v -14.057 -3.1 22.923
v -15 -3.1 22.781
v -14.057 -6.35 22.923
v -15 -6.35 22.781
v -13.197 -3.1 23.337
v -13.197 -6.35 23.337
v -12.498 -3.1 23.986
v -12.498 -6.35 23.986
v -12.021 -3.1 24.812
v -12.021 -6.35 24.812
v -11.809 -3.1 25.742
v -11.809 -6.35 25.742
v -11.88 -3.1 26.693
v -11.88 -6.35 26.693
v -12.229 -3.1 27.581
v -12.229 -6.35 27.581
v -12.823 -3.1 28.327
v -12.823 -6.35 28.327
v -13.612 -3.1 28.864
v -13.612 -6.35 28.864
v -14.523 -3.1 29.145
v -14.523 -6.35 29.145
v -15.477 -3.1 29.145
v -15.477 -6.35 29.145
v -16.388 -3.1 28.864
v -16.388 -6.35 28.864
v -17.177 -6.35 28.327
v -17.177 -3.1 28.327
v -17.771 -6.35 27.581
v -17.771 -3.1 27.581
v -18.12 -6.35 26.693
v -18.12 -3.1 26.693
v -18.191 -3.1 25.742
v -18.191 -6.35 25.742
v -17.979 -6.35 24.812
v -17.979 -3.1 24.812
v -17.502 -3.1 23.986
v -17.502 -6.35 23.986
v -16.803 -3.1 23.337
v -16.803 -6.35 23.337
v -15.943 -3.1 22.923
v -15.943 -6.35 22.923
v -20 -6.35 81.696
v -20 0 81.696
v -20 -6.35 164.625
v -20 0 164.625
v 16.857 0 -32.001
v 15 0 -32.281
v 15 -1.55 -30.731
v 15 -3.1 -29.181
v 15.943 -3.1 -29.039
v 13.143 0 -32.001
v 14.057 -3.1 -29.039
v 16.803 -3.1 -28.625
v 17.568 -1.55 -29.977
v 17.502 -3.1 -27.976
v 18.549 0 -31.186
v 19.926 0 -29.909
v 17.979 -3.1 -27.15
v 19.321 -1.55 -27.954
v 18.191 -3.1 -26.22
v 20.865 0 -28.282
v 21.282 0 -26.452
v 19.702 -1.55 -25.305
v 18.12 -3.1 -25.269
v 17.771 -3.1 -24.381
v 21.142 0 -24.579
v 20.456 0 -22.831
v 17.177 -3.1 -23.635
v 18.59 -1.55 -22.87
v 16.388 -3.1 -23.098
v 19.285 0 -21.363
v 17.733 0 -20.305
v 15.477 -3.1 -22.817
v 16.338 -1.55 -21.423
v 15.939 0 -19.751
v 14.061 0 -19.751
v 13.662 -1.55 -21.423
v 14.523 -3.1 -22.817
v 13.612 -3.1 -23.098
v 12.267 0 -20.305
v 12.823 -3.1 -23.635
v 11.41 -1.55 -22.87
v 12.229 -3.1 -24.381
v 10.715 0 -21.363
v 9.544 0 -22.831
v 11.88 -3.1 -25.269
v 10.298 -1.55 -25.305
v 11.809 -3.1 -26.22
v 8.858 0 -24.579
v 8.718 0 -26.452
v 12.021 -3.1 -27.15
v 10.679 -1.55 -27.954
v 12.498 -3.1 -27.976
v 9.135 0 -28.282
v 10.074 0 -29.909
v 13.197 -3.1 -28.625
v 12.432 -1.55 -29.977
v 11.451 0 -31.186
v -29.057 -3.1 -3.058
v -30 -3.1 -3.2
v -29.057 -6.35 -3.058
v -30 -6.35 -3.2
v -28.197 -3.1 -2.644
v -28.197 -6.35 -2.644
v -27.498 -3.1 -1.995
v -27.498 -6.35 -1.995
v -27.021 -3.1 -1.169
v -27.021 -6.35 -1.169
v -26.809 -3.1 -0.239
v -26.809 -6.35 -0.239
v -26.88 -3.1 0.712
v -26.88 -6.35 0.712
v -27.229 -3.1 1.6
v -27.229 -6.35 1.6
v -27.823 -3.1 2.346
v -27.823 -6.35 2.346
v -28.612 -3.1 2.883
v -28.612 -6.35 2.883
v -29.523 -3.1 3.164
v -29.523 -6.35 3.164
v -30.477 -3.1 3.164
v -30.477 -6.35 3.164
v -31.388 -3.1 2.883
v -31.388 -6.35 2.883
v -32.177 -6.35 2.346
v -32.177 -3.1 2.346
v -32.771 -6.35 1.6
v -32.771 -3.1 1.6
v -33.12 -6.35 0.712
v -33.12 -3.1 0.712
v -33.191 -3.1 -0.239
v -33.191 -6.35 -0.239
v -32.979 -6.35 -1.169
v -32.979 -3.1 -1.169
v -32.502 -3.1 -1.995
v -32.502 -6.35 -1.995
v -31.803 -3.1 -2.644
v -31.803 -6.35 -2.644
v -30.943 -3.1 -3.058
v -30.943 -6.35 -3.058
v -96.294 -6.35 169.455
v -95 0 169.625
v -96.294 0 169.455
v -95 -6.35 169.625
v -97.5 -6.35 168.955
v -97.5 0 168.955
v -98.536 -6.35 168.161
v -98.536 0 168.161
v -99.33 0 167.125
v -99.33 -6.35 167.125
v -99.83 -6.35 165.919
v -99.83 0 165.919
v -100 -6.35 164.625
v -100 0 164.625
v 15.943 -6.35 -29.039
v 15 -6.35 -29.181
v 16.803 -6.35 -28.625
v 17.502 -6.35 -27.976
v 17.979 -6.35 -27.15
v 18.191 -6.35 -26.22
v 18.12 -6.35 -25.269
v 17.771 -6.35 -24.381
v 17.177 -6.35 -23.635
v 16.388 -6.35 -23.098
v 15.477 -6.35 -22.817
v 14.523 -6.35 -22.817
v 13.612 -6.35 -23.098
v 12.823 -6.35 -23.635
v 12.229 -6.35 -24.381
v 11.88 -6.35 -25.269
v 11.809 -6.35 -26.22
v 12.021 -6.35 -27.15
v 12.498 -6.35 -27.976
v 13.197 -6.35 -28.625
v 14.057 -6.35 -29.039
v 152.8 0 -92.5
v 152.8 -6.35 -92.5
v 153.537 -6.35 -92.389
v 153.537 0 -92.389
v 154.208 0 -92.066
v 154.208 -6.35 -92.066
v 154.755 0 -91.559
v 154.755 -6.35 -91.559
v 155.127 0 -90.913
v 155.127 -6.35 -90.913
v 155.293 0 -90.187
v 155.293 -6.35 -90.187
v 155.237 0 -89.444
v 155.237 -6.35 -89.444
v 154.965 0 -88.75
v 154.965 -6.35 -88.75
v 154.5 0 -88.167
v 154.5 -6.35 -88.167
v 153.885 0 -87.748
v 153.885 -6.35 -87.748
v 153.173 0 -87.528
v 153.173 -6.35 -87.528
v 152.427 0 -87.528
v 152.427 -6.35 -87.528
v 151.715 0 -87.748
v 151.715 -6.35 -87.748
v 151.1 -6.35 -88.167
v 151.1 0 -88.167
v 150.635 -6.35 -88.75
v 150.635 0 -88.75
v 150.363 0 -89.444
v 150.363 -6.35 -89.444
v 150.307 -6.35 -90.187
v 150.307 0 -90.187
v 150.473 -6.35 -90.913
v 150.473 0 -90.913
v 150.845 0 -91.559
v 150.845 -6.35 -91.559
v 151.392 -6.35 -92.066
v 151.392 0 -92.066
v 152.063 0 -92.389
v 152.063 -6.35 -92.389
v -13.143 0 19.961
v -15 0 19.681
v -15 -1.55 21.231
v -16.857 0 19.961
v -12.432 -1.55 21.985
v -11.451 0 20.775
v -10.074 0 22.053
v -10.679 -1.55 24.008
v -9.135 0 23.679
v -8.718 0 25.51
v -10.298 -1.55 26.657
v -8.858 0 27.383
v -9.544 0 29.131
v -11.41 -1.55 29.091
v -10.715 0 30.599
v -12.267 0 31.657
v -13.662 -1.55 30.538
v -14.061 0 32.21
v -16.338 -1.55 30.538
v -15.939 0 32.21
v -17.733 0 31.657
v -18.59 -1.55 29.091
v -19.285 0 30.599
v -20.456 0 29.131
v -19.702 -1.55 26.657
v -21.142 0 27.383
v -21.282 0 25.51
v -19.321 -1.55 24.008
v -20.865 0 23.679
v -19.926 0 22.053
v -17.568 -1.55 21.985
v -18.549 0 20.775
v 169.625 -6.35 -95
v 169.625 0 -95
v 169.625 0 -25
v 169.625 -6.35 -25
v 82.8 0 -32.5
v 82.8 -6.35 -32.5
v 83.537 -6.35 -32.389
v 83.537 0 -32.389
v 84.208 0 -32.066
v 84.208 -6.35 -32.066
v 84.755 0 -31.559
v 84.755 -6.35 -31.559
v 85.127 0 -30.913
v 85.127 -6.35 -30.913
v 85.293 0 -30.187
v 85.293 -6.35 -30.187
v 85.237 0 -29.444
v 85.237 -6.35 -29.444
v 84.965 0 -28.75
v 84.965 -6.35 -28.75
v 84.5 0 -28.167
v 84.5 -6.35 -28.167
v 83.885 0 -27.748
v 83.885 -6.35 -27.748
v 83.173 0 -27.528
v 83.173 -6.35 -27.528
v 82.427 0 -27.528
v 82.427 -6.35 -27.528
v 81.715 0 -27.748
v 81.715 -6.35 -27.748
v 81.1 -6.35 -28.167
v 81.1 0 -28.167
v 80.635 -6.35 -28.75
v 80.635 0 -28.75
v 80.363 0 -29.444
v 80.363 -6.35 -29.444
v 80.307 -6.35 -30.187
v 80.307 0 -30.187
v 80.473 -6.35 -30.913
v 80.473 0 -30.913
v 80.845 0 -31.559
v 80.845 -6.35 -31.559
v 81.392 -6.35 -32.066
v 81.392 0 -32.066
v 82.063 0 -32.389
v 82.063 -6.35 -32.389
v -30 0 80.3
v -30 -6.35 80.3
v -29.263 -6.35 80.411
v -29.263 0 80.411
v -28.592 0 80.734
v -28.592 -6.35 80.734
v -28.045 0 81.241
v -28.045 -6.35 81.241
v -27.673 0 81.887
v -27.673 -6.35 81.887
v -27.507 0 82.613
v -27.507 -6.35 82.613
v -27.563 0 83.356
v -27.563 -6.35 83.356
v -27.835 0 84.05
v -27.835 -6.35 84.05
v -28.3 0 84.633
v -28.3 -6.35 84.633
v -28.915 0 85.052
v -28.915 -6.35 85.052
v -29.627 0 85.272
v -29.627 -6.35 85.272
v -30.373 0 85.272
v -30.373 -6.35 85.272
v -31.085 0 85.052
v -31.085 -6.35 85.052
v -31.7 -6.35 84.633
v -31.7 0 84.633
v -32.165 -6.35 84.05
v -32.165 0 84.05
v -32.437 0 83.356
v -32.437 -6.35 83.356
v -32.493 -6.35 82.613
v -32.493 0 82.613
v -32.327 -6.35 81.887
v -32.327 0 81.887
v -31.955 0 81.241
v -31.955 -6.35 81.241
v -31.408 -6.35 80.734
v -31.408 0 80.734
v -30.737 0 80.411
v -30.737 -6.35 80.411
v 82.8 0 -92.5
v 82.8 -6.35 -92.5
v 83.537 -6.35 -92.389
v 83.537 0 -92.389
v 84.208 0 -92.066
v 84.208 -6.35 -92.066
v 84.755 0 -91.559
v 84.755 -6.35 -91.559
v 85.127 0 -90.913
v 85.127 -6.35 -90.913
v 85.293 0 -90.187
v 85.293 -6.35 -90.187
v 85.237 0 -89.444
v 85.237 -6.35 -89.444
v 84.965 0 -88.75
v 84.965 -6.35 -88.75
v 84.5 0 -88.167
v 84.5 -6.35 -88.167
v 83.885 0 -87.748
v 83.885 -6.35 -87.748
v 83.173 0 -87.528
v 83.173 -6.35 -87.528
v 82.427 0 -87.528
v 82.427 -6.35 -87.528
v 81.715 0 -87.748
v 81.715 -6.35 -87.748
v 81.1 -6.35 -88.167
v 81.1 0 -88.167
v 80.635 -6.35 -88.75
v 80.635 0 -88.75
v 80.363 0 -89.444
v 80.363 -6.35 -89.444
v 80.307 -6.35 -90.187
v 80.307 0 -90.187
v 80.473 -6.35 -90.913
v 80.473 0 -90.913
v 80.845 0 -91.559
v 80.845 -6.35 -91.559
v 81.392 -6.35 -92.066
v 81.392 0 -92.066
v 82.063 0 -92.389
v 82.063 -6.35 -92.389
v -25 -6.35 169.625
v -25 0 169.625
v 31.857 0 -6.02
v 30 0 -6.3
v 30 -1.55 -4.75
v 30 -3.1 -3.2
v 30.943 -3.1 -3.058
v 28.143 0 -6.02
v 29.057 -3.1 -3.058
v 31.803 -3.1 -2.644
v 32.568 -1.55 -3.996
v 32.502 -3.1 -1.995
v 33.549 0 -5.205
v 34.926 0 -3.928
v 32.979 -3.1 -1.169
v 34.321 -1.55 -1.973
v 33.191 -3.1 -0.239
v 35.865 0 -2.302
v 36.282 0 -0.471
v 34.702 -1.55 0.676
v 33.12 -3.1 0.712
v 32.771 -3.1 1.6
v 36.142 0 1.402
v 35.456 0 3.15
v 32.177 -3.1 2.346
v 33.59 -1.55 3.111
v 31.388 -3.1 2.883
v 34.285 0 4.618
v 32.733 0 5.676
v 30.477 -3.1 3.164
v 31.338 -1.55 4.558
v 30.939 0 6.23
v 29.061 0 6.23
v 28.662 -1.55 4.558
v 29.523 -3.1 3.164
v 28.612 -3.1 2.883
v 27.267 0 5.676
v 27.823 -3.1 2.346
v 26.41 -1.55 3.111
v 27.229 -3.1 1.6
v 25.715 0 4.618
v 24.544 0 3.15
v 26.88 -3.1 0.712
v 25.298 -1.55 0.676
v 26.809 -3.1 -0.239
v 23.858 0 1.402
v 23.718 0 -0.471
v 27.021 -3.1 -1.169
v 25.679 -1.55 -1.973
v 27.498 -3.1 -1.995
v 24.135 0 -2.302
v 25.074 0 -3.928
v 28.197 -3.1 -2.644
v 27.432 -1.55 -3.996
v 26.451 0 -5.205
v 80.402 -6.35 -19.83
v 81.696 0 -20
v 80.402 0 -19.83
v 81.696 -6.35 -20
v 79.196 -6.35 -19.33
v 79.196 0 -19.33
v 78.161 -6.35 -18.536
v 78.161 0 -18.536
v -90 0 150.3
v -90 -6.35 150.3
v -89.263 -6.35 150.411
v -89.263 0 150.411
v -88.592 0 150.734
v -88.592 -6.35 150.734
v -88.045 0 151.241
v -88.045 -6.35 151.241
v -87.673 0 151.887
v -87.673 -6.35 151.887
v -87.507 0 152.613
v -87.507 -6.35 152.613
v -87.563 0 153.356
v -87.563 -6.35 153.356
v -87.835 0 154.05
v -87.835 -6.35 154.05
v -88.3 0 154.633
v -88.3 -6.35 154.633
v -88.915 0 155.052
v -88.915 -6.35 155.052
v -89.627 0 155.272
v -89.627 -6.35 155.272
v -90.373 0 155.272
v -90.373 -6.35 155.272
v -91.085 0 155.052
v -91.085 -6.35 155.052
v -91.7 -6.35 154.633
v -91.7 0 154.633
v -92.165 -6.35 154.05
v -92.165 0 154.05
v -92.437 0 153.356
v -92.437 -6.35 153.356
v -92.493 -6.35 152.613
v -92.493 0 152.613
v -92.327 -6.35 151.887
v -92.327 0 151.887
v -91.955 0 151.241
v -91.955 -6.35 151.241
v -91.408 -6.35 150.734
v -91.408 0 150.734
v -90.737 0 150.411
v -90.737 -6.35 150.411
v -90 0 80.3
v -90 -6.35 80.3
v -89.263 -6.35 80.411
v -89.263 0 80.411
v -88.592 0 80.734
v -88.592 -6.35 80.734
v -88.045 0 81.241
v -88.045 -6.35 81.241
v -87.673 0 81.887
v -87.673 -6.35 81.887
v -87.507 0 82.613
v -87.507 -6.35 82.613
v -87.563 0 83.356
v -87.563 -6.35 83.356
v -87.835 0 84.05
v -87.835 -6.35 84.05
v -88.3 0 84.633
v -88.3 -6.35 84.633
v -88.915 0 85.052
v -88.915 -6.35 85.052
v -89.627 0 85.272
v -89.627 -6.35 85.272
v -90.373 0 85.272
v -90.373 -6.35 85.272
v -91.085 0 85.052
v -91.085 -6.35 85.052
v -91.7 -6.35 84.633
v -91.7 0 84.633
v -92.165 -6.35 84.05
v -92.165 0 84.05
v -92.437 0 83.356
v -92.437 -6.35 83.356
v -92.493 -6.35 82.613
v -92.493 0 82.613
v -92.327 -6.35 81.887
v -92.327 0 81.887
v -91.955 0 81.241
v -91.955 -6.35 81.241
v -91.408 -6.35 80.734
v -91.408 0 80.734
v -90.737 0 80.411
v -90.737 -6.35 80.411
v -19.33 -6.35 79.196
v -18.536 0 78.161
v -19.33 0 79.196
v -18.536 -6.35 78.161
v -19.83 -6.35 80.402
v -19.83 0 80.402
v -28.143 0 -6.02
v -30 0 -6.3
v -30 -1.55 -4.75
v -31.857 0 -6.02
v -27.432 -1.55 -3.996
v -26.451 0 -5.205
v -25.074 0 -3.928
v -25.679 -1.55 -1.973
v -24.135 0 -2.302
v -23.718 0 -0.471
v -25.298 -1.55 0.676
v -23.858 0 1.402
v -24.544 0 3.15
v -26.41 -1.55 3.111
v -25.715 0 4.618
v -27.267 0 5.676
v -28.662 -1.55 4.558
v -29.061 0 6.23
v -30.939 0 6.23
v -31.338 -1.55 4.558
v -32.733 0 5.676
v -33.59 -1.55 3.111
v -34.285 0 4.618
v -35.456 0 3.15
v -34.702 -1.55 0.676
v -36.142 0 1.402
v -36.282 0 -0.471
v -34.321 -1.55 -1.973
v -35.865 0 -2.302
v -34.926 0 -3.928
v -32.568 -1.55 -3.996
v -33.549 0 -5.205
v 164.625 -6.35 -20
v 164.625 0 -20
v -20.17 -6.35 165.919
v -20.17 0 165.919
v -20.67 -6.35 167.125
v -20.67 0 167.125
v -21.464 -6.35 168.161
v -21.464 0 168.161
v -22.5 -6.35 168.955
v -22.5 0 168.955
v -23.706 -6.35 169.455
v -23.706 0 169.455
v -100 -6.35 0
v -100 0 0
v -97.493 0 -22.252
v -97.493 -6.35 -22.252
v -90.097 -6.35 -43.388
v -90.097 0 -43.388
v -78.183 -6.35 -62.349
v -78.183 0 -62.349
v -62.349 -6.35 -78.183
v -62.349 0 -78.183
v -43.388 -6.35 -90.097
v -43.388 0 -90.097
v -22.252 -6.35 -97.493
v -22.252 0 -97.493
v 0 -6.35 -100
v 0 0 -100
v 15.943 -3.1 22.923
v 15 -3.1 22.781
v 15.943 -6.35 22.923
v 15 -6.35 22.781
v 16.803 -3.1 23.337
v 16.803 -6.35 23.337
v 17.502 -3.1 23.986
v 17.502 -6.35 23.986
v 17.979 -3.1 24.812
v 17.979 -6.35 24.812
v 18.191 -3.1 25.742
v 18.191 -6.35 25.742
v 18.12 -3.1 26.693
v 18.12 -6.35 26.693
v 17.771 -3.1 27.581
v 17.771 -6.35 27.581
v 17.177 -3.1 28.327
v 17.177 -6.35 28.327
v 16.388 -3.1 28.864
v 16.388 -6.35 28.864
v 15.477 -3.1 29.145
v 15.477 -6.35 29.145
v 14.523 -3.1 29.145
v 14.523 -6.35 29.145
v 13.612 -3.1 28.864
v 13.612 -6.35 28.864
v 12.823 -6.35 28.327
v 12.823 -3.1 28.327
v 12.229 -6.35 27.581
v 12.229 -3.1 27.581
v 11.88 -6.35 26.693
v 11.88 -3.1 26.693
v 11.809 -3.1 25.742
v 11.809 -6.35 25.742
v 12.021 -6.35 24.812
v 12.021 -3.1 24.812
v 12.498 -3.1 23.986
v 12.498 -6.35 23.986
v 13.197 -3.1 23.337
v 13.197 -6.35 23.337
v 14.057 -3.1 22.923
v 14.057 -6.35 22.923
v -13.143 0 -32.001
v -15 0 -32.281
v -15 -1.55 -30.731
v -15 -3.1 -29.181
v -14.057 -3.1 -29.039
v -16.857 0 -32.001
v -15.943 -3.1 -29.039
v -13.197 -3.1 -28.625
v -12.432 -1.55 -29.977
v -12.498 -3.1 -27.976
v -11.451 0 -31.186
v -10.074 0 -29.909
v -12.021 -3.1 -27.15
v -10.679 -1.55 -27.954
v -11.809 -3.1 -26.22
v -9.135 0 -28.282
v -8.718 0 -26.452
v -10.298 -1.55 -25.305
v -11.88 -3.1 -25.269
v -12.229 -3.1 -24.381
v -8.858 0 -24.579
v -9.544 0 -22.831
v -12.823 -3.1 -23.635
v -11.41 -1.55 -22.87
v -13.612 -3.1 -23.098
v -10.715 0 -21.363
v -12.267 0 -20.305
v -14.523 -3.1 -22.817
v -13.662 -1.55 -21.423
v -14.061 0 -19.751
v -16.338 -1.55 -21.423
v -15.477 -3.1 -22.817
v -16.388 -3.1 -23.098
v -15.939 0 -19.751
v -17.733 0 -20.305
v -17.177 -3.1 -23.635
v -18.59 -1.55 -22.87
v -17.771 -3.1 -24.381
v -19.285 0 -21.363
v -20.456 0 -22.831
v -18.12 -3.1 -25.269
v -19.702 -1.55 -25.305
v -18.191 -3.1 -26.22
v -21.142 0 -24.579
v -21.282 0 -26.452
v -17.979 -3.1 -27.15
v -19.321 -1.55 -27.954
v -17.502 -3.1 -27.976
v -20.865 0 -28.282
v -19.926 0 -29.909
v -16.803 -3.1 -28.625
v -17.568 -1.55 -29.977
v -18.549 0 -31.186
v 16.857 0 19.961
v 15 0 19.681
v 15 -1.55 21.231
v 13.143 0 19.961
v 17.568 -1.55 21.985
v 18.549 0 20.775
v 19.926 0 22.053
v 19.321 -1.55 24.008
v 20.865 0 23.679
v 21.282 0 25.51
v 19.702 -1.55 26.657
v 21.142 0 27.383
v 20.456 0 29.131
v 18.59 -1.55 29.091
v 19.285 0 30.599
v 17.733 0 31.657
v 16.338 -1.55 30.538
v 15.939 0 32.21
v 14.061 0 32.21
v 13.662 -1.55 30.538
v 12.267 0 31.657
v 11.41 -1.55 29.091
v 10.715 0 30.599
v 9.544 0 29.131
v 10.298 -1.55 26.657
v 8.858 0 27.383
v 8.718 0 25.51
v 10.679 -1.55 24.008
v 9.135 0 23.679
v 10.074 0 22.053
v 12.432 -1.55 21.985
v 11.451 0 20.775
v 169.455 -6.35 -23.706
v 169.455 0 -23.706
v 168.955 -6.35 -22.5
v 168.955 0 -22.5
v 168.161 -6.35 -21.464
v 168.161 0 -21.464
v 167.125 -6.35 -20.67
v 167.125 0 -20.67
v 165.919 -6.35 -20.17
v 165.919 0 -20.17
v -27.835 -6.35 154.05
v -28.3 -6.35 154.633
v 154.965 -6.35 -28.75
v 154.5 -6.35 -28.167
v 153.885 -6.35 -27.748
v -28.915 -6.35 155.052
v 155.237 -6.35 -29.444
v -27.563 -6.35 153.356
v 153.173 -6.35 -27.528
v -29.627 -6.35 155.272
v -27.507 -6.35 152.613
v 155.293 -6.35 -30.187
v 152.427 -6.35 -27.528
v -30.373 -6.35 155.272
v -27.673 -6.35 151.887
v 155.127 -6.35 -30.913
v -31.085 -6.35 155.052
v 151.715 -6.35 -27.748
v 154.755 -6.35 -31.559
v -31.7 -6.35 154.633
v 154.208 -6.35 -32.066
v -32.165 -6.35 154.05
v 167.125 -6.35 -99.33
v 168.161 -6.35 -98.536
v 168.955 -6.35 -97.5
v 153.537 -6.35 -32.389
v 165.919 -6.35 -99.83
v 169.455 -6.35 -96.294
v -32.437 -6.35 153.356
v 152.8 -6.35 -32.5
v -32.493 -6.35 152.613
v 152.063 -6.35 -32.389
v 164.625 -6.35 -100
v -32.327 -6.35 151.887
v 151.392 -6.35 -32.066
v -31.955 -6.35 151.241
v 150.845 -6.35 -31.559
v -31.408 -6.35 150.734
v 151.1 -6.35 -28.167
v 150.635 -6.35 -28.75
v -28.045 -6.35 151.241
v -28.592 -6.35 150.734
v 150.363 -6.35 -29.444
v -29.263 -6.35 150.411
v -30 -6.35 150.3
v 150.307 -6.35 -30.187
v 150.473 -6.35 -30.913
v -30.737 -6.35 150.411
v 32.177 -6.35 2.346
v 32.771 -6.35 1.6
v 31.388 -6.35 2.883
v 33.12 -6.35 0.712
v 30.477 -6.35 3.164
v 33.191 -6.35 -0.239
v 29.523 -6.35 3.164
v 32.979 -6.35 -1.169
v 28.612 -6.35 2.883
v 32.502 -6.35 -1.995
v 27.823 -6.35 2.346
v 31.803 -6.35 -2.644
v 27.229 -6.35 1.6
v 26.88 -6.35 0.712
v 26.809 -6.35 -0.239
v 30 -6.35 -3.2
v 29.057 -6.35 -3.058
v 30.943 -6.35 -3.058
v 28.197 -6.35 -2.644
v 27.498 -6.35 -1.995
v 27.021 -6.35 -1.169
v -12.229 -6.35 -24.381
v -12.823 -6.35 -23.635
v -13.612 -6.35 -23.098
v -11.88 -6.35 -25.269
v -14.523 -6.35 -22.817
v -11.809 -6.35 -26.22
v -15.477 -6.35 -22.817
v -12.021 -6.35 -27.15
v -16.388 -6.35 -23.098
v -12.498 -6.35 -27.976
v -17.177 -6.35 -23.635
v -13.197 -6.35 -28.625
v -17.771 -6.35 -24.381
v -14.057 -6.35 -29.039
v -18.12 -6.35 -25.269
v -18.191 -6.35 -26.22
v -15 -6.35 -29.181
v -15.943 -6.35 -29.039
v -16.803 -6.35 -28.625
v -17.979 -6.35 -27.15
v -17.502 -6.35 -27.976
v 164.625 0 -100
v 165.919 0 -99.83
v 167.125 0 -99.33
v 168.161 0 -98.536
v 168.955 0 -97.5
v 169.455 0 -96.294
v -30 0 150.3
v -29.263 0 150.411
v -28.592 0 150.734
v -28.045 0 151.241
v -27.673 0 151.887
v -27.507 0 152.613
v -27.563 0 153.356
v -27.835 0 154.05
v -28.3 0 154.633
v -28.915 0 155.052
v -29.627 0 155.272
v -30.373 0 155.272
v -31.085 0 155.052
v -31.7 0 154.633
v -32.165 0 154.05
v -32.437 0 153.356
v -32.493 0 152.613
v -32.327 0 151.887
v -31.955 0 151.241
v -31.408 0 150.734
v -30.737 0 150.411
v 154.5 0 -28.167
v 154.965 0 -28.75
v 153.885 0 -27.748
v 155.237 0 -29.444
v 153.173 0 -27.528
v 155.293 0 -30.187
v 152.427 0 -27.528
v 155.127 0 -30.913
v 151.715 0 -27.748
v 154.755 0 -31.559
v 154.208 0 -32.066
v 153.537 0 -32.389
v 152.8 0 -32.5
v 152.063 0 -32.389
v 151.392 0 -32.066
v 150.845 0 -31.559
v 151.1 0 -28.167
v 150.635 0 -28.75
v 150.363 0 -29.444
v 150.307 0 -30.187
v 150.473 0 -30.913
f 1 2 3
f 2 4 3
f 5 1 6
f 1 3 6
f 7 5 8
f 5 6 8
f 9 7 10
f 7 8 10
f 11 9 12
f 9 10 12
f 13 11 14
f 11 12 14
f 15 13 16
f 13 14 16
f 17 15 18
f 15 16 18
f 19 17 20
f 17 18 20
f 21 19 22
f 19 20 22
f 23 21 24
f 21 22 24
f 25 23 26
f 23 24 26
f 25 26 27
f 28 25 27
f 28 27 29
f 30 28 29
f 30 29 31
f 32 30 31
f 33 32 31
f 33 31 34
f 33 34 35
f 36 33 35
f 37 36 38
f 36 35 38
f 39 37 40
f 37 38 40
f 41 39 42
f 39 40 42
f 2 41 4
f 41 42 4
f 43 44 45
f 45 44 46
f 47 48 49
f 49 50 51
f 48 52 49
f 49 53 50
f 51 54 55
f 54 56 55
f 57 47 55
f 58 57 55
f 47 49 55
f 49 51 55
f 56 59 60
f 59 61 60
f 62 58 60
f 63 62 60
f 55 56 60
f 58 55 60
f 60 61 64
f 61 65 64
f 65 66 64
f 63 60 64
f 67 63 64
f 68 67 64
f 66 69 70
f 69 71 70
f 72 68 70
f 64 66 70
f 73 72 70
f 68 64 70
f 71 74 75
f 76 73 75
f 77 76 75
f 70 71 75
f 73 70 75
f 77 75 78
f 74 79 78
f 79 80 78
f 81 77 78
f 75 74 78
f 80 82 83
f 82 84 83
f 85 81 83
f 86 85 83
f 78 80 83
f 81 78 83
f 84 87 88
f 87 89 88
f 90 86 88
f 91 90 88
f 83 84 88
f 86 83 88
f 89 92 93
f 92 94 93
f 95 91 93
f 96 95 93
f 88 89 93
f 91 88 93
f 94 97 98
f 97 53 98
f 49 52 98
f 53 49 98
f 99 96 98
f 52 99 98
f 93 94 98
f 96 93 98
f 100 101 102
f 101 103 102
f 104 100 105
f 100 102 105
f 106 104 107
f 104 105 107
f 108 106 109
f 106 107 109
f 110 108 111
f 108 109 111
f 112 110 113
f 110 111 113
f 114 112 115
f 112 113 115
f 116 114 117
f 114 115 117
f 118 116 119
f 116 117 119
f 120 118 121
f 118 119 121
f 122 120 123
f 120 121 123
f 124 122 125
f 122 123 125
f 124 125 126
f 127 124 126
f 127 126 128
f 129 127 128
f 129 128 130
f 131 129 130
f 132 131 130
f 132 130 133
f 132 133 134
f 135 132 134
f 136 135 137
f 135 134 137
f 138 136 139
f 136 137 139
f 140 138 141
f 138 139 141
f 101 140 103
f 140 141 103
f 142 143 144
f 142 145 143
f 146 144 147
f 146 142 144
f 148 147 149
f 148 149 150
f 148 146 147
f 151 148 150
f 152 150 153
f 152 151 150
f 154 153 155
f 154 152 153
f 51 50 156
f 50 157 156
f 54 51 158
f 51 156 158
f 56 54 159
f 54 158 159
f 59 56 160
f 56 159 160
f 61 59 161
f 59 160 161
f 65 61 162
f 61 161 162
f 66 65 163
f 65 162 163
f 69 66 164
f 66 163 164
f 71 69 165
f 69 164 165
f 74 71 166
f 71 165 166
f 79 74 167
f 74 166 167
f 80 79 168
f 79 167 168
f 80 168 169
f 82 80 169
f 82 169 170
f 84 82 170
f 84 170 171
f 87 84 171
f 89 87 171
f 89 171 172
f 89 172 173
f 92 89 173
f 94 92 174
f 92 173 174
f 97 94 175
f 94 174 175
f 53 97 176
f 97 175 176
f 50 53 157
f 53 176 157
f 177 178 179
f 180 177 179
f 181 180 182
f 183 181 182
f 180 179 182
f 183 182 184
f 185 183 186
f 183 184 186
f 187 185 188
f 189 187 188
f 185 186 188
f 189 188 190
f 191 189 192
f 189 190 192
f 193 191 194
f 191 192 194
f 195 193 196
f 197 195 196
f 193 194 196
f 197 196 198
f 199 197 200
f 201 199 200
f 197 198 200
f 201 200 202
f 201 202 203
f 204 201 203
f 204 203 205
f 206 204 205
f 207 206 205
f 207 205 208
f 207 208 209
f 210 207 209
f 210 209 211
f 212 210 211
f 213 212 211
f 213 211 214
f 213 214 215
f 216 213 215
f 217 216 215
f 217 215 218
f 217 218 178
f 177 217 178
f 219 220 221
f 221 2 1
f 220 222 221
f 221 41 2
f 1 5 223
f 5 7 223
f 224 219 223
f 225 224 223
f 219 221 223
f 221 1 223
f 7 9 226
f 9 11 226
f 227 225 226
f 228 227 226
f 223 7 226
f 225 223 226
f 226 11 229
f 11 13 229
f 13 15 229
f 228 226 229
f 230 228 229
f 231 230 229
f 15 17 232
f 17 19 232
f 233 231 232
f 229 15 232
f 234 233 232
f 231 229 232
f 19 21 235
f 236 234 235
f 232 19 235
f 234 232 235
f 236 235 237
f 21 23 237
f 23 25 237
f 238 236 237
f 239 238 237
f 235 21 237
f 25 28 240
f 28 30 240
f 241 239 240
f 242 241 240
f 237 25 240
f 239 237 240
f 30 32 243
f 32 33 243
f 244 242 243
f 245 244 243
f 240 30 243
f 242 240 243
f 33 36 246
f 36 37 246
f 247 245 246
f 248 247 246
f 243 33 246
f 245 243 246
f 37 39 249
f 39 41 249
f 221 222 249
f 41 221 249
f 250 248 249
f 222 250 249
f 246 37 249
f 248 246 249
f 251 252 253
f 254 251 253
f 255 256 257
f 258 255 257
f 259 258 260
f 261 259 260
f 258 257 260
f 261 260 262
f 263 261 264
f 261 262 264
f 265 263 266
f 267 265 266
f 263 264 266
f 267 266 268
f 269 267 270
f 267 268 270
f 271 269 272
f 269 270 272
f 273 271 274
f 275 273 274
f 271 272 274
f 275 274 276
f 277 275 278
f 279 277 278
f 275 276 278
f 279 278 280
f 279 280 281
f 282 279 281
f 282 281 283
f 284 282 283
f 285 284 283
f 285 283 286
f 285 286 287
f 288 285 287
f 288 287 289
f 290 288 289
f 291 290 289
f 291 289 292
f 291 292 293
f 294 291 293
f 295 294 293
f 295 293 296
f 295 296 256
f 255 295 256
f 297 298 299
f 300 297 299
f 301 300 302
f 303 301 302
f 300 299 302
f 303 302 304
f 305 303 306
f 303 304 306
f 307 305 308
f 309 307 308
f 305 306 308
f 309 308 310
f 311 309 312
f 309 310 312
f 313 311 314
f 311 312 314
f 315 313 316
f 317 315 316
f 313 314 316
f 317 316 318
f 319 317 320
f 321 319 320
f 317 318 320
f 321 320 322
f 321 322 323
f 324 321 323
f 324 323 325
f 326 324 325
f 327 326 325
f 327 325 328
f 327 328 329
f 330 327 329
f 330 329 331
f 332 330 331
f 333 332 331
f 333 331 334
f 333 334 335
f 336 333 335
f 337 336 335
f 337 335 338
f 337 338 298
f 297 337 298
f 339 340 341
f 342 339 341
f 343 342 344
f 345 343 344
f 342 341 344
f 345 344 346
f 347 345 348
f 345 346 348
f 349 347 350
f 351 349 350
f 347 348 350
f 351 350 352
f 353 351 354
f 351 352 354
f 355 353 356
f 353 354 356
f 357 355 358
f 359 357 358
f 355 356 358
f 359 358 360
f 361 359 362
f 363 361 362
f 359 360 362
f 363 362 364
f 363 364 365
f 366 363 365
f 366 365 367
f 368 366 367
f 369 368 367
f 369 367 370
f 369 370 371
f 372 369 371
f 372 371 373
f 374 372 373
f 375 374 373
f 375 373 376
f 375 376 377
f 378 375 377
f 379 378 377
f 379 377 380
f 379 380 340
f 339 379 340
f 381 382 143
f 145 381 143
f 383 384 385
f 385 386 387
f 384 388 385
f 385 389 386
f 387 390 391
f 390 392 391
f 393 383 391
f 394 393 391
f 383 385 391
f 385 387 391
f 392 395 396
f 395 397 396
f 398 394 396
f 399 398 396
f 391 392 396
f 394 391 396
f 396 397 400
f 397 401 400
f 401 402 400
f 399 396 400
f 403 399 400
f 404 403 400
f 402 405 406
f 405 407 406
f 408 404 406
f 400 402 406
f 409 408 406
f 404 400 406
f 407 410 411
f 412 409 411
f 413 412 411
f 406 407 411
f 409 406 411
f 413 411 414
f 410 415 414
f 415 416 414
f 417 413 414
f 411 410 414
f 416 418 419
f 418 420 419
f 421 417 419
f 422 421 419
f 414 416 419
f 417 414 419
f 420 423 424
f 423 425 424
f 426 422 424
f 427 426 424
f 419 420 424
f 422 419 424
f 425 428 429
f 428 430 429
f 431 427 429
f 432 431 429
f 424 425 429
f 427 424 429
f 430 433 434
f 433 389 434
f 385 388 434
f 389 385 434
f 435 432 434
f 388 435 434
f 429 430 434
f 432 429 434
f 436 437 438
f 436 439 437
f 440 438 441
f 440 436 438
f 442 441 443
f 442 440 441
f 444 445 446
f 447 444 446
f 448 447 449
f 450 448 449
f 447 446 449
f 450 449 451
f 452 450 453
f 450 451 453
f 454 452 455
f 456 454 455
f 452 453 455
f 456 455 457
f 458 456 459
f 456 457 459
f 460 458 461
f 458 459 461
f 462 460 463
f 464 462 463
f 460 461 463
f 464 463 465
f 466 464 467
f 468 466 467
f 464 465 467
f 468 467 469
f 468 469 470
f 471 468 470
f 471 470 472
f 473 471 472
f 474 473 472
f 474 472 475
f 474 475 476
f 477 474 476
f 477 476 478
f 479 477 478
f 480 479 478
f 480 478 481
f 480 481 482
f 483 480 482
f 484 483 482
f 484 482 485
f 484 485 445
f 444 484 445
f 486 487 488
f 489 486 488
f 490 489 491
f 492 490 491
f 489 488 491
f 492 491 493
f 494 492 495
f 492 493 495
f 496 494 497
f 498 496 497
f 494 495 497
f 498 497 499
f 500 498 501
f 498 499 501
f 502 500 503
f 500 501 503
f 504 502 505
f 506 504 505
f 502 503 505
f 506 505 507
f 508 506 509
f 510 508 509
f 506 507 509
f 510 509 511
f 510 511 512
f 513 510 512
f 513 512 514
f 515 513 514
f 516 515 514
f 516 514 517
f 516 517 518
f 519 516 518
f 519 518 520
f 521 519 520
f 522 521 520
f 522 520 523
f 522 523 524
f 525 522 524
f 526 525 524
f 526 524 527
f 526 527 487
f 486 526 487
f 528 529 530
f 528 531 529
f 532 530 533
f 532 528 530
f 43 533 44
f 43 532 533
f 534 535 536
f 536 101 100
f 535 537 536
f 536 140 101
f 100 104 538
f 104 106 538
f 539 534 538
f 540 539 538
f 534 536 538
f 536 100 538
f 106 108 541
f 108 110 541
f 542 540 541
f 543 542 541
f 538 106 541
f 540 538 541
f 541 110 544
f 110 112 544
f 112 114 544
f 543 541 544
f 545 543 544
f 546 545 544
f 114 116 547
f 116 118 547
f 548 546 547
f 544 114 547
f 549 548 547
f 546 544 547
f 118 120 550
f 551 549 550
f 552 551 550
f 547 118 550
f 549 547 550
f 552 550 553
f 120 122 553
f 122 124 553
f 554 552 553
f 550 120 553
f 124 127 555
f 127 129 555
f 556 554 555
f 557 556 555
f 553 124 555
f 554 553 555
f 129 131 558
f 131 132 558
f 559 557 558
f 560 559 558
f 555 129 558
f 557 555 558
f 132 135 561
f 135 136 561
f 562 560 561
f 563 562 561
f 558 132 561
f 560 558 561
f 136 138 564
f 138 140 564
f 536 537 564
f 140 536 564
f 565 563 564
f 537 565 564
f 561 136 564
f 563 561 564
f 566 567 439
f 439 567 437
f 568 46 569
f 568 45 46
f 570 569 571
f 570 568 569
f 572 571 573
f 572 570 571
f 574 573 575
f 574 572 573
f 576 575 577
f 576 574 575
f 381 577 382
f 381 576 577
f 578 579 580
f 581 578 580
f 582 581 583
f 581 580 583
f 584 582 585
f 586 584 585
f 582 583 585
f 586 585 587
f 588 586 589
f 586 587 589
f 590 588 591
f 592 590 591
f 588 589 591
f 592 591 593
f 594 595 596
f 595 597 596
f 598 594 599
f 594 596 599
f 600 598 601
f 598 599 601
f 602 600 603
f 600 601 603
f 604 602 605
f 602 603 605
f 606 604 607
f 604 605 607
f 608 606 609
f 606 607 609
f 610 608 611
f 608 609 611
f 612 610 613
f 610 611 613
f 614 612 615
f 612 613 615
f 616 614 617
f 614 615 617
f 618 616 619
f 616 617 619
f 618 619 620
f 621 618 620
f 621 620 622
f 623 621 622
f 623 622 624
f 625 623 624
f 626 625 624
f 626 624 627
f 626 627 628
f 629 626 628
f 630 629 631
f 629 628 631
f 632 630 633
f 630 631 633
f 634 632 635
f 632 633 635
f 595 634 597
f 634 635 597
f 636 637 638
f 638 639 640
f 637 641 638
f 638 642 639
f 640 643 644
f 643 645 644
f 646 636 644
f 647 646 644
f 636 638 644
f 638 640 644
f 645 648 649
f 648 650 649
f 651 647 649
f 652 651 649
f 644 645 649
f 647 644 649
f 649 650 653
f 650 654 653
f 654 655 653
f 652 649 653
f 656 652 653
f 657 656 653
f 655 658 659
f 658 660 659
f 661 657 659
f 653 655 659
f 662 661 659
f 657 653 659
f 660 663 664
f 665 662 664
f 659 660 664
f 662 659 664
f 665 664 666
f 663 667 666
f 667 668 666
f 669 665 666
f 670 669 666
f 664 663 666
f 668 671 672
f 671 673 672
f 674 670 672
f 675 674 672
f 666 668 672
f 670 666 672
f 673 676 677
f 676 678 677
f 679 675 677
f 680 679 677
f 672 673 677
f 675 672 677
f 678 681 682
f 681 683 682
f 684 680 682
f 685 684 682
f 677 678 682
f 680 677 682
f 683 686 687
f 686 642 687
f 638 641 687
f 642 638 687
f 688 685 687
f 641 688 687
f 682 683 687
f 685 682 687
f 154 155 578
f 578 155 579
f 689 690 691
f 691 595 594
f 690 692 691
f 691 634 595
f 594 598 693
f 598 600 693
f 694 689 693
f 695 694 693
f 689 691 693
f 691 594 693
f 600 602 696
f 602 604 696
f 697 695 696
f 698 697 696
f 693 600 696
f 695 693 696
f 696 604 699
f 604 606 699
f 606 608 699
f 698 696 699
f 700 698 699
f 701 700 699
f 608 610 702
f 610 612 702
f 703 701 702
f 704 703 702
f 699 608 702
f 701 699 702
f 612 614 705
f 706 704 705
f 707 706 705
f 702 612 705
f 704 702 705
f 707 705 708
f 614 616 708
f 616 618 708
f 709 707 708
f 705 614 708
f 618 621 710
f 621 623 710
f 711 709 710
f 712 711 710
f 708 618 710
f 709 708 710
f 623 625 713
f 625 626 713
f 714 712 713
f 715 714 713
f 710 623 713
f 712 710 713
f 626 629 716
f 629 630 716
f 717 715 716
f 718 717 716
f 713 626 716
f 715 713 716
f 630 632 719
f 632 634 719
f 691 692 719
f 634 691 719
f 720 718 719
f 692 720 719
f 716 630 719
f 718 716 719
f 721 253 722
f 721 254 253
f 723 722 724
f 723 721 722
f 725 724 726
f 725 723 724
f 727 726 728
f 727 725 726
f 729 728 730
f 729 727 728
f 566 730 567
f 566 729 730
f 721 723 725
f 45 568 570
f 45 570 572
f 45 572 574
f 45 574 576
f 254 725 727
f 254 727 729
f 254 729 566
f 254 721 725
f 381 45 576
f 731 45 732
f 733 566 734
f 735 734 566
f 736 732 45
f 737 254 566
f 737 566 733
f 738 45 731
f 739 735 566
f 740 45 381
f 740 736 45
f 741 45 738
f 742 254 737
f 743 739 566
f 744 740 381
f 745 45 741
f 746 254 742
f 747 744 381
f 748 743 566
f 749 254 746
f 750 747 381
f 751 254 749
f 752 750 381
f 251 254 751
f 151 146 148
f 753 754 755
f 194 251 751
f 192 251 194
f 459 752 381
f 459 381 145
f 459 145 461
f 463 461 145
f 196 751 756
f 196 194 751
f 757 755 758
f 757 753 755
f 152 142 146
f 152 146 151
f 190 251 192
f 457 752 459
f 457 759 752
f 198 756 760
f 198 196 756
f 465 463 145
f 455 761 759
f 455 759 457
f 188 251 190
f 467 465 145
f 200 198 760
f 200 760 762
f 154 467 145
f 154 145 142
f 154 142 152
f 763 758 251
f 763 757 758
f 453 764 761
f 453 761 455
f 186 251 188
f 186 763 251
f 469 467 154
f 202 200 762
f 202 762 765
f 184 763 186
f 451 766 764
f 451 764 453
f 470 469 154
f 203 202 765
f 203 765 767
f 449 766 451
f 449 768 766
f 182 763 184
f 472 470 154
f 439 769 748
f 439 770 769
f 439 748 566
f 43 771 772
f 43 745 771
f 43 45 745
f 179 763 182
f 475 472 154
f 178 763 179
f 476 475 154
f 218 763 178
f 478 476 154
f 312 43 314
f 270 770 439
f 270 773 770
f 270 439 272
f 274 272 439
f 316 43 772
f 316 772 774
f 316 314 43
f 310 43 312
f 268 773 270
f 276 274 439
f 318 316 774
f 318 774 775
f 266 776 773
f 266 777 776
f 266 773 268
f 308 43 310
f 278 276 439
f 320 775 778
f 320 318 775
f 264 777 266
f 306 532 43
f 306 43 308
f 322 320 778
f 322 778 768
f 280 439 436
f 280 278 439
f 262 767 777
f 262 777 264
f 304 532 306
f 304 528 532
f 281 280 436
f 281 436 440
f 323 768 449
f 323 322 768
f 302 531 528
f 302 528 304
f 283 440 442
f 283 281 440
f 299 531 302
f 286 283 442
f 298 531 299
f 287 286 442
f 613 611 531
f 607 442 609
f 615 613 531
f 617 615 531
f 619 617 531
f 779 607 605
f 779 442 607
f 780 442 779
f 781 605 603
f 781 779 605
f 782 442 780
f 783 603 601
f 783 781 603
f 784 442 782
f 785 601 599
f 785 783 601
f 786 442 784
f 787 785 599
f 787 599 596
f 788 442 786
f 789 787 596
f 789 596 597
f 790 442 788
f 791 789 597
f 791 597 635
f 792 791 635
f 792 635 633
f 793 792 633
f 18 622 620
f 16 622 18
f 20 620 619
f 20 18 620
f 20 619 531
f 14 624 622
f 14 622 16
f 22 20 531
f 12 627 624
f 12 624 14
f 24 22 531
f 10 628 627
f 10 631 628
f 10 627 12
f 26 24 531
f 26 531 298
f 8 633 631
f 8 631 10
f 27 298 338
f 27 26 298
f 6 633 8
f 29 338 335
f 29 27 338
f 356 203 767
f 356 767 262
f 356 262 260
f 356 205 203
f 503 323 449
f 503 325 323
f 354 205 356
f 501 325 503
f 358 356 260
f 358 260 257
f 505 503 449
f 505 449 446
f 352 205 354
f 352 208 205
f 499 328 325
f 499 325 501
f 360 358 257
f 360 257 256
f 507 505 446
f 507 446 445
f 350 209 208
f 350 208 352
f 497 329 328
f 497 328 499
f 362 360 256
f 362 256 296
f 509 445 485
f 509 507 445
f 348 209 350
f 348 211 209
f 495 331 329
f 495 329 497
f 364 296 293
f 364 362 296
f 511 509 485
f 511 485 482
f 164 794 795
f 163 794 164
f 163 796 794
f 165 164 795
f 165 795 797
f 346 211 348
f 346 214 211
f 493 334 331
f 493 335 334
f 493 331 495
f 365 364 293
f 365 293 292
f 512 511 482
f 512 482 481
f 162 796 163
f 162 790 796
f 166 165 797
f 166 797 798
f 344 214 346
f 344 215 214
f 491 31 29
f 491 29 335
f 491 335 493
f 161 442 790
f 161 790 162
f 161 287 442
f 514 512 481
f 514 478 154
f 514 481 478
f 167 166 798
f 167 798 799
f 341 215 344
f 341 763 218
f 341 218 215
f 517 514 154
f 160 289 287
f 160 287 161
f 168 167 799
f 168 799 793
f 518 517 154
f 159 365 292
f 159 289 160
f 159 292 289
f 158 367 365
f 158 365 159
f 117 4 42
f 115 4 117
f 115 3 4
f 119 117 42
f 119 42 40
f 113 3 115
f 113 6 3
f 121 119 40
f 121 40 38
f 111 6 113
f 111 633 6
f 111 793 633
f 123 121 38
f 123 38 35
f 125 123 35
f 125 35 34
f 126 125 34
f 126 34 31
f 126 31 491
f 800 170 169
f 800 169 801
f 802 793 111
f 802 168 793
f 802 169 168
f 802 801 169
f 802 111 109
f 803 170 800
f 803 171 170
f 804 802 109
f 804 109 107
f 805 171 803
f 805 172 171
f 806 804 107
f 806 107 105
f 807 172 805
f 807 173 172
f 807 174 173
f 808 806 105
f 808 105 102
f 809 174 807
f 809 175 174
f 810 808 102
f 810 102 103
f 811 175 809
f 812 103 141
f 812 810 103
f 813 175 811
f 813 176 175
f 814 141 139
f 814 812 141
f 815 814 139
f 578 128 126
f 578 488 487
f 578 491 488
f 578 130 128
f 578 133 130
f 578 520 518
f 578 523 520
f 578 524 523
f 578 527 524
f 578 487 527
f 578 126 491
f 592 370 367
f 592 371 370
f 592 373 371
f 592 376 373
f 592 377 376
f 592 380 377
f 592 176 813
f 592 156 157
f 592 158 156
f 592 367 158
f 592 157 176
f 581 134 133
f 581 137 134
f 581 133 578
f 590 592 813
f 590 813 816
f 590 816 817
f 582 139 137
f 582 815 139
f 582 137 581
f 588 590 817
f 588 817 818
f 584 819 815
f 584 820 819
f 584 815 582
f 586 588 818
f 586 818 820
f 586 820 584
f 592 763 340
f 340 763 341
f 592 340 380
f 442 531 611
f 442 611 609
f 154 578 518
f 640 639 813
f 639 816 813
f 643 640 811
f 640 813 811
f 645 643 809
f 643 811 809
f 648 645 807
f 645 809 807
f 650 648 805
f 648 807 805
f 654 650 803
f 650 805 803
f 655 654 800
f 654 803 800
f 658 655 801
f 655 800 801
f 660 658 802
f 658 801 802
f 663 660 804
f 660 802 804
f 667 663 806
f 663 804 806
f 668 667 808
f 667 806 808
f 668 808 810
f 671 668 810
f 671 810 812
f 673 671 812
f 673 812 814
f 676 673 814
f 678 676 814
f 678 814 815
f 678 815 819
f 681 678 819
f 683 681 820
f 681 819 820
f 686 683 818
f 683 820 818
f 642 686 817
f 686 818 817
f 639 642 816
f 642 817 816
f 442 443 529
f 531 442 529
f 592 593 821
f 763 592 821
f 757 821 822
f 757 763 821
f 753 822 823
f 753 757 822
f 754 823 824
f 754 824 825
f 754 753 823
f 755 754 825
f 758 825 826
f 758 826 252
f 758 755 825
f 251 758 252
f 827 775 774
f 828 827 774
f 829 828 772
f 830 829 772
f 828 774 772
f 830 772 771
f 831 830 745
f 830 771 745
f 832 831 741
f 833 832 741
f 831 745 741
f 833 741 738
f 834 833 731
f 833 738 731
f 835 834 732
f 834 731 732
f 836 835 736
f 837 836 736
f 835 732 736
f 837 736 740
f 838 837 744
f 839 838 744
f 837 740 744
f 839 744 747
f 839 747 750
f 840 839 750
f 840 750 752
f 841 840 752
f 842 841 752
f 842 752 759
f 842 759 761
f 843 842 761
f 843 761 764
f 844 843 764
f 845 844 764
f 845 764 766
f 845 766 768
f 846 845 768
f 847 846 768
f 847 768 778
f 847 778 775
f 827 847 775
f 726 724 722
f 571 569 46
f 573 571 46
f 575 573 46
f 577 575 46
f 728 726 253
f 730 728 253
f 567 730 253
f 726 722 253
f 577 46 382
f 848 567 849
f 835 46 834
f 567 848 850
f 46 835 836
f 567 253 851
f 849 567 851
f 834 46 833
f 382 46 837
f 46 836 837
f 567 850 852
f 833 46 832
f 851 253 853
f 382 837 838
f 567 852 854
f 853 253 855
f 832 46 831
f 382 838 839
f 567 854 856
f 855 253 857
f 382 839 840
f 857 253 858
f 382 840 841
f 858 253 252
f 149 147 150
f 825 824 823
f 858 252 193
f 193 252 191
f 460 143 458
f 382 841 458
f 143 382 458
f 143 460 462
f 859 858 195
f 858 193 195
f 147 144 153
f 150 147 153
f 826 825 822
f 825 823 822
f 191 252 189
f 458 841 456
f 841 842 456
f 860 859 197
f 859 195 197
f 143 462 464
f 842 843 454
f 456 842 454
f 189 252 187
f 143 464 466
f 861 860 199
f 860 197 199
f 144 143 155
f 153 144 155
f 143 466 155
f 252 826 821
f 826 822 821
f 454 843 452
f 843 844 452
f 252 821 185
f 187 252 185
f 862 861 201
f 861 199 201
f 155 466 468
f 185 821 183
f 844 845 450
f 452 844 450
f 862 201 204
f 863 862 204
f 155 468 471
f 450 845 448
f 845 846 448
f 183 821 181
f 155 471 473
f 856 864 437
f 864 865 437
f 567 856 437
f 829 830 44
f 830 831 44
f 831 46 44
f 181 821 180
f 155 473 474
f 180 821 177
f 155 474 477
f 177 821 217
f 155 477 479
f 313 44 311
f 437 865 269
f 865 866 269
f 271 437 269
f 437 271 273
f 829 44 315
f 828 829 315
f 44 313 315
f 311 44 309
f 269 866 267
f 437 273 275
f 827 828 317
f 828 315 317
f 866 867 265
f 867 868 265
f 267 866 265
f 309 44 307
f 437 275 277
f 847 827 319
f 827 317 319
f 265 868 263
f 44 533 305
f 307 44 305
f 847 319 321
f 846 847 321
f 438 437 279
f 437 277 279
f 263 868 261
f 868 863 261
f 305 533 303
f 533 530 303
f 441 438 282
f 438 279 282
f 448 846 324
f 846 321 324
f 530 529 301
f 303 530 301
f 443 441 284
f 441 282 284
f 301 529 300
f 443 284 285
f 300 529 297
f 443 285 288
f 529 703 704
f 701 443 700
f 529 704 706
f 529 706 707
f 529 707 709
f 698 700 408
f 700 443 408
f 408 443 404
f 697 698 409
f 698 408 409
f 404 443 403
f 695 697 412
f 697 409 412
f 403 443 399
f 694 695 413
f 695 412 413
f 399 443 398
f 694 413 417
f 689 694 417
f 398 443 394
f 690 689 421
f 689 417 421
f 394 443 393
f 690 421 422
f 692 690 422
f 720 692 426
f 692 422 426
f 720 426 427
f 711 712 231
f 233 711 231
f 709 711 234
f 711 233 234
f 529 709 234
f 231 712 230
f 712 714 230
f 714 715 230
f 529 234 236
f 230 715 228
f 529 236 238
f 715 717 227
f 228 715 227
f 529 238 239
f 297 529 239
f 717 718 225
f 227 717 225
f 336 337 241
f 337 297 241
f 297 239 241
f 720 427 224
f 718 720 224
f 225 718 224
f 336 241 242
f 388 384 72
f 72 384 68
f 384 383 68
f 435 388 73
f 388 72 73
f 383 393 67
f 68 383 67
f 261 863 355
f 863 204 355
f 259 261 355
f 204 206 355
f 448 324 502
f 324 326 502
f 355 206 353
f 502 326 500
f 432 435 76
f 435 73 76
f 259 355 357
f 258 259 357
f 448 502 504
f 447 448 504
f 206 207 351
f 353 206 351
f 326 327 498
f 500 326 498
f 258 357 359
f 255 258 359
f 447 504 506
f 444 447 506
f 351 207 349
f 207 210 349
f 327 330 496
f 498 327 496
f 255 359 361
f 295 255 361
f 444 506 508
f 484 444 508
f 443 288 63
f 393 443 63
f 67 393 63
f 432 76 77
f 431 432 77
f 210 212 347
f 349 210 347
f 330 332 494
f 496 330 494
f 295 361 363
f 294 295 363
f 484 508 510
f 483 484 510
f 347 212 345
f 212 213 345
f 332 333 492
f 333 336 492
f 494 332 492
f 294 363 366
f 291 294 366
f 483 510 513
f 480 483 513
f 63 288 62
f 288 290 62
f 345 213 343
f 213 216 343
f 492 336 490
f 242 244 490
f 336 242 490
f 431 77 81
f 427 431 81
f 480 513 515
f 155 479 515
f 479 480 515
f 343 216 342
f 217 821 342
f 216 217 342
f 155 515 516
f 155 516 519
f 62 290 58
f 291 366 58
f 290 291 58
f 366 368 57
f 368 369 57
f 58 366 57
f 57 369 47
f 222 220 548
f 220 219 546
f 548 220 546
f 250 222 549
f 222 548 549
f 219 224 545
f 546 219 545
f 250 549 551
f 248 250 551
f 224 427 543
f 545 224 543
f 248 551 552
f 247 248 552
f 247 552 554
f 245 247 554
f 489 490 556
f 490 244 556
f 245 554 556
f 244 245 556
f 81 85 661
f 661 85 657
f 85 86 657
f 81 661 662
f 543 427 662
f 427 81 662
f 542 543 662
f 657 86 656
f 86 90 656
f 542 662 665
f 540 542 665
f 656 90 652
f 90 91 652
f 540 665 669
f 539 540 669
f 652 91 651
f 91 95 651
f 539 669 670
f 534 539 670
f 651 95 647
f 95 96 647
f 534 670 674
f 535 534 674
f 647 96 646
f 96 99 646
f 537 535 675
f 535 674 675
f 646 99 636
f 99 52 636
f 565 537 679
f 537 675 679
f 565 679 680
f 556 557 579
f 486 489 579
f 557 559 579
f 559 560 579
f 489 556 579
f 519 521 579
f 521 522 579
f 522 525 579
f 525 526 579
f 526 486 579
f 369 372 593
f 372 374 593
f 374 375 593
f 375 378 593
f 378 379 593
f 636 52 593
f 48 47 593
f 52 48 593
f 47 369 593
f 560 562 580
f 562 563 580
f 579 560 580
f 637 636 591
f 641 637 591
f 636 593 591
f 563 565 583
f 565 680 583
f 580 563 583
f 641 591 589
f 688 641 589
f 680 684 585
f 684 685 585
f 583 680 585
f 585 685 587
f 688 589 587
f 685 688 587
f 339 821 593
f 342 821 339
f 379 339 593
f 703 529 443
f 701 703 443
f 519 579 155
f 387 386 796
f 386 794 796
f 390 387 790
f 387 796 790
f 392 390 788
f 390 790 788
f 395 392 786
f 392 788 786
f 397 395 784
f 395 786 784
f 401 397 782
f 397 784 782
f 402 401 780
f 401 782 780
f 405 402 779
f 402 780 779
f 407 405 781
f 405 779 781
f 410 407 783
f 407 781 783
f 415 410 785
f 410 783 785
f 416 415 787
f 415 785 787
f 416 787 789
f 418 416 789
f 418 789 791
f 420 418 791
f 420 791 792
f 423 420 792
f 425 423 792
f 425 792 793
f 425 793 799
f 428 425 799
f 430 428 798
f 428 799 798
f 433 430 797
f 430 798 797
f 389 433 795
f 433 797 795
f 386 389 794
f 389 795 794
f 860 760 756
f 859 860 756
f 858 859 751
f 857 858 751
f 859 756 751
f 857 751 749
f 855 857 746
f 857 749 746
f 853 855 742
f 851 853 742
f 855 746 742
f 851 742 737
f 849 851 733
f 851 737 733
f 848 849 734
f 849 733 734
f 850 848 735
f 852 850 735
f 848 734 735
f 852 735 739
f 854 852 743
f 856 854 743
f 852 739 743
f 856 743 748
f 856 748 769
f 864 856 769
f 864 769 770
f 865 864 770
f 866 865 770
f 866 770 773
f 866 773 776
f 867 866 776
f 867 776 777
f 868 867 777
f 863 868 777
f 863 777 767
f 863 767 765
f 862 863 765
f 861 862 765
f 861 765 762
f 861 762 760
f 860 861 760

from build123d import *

# Parameters (mm, degrees)
BOSS_EXTRUDE1_DEPTH                             = 6.35
FILLET1_R                                       = 5
TAP_DRILL_FOR_M6X1_0_TAP1_D                     = 5
CSK_FOR_M6_FLAT_HEAD_MACHINE_SCREW1_D           = 6.4
CSK_FOR_M6_FLAT_HEAD_MACHINE_SCREW1_CSINK_D     = 12.6
CSK_FOR_M6_FLAT_HEAD_MACHINE_SCREW1_CSINK_ANGLE = 90


with BuildPart() as part:
    # Sketch1 → Boss-Extrude1 (new body)
    with BuildSketch(Plane(origin=(0, 0, 0), x_dir=(1, 0, 0), z_dir=(0, 1, 0))):
        with BuildLine():
            Line((0, 100), (169.625, 100))
            Line((169.625, 100), (169.625, 20))
            Line((169.625, 20), (79.625, 20))
            Line((79.625, 20), (-20, -79.625))
            Line((-20, -79.625), (-20, -169.625))
            Line((-20, -169.625), (-100, -169.625))
            Line((-100, -169.625), (-100, 0))
            ThreePointArc((-100, 0), (-70.710678119, 70.710678119), (0, 100))
        make_face()
    extrude(amount=-BOSS_EXTRUDE1_DEPTH)

    # Fillet1
    fillet1_edges = [part.edges().sort_by_distance(p)[0] for p in [
        (169.625, -3.175, -20),
        (79.625, -3.175, -20),
        (-20, -3.175, 79.625),
        (-20, -3.175, 169.625),
        (-100, -3.175, 169.625),
        (169.625, -3.175, -100),
    ]]
    fillet(fillet1_edges, radius=FILLET1_R)

    # Tap Drill for M6x1.0 Tap1 (through all)
    with Locations(Plane(origin=(82.8, 0, -90), x_dir=(0, 0, 1), z_dir=(0, 1, 0))):
        with Locations((0, 0), (0, 70), (60, 70), (172.8, -172.8), (172.8, -112.8), (242.8, -112.8), (242.8, -172.8), (60, 0)):
            Hole(TAP_DRILL_FOR_M6X1_0_TAP1_D / 2)

    # CSK for M6 Flat Head Machine Screw1 (through all)
    with Locations(Plane(origin=(15, 0, -25.980762114), x_dir=(0, 0, 1), z_dir=(0, 1, 0))):
        with Locations((0, 0), (25.980762114, 15), (51.961524228, 0), (51.961524228, -30), (25.980762114, -45), (0, -30)):
            CounterSinkHole(CSK_FOR_M6_FLAT_HEAD_MACHINE_SCREW1_D / 2, CSK_FOR_M6_FLAT_HEAD_MACHINE_SCREW1_CSINK_D / 2, counter_sink_angle=CSK_FOR_M6_FLAT_HEAD_MACHINE_SCREW1_CSINK_ANGLE)


solid = part.part
